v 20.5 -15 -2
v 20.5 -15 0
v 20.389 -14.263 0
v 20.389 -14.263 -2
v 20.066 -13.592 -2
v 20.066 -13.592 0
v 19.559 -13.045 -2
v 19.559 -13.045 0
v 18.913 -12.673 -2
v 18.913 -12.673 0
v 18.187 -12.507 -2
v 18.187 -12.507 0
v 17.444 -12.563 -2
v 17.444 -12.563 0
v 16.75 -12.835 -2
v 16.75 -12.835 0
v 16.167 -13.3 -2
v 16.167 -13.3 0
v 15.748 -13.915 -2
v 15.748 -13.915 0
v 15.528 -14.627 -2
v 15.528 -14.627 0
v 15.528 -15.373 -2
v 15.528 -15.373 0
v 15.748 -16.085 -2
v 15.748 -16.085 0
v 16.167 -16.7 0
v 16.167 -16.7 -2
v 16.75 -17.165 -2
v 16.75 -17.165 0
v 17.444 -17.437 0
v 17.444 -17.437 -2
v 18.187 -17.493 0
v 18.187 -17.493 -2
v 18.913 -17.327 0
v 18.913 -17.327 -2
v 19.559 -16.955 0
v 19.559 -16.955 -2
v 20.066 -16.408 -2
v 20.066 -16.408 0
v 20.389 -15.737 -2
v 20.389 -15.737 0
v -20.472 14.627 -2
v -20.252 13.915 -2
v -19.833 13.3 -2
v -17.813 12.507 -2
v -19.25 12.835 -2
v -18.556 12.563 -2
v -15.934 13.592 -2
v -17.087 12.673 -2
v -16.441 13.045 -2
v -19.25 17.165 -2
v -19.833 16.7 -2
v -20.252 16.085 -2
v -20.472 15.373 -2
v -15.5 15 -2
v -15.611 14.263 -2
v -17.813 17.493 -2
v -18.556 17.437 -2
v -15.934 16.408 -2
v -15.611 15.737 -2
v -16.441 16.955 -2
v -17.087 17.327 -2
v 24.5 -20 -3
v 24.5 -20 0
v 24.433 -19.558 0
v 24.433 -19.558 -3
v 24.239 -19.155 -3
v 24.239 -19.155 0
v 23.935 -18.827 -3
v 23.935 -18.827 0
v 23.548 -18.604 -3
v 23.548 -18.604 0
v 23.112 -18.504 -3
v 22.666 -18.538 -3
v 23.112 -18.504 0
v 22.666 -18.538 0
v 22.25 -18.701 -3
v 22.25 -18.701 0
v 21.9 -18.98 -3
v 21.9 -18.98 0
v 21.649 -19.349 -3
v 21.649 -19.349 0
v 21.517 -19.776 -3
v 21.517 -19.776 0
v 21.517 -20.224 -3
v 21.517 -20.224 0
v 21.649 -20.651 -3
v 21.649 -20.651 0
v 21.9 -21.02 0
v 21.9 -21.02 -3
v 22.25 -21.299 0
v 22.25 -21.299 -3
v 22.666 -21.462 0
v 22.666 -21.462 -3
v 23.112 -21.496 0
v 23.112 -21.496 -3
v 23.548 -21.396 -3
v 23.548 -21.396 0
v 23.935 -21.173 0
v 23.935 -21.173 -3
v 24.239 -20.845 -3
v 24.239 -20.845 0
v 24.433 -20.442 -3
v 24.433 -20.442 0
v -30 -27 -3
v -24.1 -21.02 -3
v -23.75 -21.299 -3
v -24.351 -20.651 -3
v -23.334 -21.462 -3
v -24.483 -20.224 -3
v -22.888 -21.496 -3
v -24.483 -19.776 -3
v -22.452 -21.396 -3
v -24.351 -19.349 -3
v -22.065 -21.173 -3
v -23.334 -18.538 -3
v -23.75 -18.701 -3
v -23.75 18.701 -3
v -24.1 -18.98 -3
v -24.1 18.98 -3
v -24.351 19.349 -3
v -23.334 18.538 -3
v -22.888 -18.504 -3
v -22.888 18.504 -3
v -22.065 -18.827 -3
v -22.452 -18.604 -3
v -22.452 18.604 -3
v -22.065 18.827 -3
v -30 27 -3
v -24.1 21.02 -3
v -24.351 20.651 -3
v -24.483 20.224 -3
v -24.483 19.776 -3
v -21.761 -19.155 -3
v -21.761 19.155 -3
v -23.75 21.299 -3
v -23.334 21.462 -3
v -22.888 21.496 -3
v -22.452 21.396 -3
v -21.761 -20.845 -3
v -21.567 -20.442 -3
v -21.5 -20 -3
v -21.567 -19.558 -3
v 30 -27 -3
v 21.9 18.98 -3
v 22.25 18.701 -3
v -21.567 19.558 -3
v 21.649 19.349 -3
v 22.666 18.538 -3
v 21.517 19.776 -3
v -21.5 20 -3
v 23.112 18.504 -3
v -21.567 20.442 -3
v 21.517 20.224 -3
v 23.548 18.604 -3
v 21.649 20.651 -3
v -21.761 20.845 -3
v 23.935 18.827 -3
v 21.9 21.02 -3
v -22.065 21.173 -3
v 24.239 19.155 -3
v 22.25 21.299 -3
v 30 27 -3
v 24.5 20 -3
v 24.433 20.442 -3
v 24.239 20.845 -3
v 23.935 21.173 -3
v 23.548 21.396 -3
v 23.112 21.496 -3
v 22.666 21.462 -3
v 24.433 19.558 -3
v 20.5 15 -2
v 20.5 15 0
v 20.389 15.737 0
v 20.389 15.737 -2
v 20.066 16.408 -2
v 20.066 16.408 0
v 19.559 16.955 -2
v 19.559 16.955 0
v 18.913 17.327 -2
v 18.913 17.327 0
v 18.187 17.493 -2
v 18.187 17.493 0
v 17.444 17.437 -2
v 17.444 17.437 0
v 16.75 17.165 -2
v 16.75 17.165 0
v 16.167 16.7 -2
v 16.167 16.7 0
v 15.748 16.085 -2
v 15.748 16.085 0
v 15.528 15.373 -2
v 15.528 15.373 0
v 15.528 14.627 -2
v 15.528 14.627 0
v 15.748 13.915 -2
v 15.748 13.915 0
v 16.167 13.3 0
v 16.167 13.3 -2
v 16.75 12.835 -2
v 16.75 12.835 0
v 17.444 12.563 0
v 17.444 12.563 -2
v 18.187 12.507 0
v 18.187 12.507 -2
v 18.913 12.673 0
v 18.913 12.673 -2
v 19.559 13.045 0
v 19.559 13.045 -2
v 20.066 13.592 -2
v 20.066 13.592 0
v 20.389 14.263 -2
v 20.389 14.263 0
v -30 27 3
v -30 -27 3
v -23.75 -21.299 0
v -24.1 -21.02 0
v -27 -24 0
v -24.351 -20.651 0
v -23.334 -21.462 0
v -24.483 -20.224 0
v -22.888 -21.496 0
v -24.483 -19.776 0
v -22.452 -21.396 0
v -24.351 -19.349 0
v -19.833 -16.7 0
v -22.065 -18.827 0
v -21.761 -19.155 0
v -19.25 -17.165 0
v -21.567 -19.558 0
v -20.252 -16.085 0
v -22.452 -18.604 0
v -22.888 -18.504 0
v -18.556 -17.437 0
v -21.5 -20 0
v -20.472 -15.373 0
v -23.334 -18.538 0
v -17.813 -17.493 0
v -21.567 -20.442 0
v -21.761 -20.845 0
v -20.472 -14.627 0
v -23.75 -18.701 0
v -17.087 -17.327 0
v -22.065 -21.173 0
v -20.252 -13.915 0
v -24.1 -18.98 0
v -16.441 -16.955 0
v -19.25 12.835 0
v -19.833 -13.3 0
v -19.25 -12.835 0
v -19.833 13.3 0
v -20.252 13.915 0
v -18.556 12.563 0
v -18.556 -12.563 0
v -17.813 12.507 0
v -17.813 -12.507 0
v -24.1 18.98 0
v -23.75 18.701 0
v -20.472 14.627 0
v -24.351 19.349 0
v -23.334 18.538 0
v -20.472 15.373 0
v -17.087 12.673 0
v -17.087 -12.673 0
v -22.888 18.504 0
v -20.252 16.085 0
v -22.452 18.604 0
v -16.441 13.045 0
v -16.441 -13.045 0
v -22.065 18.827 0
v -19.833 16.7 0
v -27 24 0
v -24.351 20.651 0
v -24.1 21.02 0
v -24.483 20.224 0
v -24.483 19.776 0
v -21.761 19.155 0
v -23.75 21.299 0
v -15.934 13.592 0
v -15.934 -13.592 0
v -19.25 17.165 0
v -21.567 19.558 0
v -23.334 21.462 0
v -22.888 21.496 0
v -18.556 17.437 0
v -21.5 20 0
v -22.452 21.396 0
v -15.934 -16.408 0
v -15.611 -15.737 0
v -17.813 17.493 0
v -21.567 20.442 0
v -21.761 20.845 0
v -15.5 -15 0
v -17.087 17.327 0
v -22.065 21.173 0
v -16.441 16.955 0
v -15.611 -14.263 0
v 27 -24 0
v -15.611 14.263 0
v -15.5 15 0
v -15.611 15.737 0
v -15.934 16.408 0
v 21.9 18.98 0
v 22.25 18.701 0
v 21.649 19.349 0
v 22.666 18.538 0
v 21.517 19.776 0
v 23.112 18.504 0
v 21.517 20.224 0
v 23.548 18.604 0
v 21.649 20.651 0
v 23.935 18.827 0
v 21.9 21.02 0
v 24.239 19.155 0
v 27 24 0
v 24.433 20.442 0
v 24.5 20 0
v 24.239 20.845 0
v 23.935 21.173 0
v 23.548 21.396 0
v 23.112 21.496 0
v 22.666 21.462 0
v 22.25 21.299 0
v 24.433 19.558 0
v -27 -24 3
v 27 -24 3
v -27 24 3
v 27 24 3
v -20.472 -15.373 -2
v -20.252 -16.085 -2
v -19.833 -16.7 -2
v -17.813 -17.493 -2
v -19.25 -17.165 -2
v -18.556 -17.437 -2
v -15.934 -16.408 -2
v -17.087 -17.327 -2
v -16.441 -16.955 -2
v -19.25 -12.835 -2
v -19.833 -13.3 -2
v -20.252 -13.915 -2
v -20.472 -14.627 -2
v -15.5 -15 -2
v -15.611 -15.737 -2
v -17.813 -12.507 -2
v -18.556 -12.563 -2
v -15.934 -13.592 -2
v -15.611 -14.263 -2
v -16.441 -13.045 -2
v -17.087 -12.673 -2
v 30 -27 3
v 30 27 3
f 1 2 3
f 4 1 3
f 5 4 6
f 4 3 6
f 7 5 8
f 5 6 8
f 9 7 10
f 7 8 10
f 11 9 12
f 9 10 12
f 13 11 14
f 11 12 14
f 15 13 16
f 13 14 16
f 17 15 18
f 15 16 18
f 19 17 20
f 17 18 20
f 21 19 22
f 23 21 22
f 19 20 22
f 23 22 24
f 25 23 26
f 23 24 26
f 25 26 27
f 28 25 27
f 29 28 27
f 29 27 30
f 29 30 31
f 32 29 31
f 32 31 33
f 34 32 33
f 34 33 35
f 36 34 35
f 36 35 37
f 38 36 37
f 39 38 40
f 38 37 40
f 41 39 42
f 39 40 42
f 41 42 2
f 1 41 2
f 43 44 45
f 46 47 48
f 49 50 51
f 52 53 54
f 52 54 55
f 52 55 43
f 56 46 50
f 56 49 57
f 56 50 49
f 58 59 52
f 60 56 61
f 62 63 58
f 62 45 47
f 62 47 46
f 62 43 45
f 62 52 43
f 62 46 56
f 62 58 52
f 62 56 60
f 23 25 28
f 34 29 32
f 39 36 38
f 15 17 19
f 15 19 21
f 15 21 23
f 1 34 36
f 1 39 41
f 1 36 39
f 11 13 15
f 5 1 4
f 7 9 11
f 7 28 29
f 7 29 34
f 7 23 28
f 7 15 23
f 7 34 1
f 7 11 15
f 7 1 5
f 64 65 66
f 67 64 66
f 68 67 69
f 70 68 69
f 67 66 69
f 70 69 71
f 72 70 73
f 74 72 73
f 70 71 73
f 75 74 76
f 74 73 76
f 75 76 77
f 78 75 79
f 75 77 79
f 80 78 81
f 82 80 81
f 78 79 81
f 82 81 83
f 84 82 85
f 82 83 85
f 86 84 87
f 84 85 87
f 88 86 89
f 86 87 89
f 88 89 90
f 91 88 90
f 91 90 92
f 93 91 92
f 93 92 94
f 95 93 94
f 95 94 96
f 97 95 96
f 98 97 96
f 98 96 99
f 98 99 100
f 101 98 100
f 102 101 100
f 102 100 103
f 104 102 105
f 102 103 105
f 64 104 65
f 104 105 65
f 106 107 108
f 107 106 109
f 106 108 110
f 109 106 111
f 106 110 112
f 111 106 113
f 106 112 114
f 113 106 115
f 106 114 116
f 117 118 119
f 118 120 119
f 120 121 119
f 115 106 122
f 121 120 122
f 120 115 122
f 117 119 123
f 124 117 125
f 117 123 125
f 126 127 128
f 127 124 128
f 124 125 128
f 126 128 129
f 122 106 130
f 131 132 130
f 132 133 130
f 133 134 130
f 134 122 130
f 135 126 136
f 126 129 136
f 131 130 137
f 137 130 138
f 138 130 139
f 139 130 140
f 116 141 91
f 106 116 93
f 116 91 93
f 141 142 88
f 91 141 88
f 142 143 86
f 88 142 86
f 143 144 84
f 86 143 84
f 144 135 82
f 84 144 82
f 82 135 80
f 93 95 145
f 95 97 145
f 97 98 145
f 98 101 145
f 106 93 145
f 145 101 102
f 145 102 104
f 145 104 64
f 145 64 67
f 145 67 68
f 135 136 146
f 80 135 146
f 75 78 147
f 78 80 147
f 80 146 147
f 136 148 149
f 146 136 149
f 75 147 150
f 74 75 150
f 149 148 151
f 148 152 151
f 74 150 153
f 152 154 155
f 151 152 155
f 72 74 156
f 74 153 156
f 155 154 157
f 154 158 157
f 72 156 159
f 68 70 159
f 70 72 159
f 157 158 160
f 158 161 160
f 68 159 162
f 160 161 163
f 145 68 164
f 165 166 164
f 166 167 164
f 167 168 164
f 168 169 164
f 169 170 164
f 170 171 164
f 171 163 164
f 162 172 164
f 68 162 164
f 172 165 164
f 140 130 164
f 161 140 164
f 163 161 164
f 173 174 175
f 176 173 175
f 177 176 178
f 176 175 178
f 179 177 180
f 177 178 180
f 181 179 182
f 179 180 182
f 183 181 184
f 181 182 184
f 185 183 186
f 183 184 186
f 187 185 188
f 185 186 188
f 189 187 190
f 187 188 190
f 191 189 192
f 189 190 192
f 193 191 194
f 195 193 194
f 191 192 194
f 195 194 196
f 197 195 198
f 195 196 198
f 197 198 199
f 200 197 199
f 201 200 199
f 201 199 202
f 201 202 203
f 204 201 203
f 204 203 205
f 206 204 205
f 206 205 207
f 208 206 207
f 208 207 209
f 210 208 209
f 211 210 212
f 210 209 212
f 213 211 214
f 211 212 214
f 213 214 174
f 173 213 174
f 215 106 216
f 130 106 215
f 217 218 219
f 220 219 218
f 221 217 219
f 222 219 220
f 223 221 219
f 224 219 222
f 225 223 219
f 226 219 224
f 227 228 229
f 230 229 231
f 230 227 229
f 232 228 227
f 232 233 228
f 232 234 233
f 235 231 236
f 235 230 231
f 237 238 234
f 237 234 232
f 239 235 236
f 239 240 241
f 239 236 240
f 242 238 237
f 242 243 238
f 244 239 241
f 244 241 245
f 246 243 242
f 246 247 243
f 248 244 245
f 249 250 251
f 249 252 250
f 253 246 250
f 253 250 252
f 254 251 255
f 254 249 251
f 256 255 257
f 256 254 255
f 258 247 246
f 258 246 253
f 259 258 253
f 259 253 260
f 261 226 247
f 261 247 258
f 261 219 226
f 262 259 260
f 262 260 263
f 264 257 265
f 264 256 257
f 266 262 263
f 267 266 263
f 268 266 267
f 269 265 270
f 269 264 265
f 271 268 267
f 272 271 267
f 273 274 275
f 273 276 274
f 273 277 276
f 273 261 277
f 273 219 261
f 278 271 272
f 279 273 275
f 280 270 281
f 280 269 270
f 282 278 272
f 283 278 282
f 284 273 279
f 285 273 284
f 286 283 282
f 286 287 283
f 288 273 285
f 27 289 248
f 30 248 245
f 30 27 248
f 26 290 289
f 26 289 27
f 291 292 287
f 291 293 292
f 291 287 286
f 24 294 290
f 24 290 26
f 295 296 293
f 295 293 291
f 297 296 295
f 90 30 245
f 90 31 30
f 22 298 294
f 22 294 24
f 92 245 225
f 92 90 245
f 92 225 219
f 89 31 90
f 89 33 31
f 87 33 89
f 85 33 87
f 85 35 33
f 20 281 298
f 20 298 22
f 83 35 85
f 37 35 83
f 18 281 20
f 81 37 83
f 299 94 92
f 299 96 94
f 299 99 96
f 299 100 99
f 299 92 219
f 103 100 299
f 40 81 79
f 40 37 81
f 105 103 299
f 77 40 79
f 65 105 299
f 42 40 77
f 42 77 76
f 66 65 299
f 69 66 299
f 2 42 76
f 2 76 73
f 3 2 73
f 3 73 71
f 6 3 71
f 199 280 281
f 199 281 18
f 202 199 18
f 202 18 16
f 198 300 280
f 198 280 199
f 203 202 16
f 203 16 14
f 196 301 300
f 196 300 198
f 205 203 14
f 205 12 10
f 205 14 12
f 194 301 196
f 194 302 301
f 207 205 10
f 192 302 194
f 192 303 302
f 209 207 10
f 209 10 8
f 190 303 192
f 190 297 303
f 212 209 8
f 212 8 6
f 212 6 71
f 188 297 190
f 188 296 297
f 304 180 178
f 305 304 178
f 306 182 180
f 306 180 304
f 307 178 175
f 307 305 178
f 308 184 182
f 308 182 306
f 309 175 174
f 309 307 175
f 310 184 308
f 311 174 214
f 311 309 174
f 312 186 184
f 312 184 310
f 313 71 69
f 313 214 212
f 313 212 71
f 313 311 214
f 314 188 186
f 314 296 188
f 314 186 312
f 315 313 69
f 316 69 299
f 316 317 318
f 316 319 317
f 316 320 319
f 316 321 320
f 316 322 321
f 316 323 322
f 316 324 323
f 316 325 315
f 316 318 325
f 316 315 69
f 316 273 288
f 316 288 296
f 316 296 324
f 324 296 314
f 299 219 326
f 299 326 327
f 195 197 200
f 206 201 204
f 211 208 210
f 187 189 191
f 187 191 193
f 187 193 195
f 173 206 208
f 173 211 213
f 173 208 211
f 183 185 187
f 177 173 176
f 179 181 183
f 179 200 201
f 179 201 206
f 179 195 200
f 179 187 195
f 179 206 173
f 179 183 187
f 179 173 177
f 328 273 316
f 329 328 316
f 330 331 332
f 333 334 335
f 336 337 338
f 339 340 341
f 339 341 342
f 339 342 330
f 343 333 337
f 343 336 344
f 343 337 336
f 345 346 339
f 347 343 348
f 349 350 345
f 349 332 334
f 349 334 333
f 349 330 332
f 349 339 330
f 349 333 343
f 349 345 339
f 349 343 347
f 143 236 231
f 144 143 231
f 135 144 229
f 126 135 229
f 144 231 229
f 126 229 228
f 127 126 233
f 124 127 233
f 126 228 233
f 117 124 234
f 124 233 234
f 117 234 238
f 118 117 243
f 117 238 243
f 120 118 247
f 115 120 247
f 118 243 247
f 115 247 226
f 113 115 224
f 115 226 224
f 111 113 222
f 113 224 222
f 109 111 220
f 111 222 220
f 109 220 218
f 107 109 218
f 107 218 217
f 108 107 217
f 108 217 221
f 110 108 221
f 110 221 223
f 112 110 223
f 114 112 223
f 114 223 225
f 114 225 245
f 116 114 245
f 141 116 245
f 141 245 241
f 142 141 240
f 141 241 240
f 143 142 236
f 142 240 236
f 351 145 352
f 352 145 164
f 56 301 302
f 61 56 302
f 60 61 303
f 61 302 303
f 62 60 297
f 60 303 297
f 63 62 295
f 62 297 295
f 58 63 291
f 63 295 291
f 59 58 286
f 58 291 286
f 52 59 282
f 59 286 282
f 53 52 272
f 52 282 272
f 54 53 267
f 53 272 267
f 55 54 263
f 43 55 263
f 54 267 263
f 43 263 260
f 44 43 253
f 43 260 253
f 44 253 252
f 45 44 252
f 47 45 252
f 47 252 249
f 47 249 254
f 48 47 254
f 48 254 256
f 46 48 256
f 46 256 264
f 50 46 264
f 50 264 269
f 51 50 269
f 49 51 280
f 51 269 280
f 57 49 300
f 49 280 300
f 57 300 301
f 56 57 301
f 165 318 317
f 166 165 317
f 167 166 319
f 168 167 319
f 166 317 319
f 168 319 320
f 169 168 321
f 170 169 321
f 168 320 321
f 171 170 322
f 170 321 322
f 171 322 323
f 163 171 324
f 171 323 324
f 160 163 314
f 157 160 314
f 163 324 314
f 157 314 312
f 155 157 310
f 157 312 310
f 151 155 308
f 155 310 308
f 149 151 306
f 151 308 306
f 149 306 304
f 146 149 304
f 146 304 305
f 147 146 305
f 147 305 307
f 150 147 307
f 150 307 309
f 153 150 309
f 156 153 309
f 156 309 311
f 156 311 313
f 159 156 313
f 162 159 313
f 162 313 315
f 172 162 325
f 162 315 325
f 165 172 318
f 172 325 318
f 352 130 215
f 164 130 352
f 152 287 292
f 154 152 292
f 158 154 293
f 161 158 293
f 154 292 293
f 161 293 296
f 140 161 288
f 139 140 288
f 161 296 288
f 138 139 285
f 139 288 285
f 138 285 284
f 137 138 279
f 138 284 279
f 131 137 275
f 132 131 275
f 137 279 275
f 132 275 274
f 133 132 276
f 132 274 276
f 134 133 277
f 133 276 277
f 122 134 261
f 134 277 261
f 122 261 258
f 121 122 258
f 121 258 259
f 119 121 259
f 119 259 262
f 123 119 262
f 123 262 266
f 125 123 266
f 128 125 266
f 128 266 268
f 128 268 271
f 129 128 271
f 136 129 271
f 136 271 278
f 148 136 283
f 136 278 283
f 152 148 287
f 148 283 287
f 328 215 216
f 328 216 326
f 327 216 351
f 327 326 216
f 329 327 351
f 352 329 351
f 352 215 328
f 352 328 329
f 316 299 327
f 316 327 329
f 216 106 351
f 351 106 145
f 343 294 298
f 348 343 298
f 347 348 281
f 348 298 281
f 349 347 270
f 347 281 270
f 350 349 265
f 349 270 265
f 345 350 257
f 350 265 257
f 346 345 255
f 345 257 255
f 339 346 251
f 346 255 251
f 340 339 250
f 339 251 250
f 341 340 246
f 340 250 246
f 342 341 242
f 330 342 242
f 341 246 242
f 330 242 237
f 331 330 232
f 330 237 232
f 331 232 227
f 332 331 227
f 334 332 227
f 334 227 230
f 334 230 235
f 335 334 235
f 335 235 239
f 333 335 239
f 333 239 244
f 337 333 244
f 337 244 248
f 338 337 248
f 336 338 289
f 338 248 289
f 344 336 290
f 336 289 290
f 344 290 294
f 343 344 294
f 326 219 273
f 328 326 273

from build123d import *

# Parameters (mm, degrees)
F0_W     = 60
F0_H     = 54
F0_W_2   = 54
F0_H_2   = 48
F1_DEPTH = 3
F2_DEPTH = 3
F3_R     = 2.5
F4_DEPTH = 2
F5_R     = 1.5
F6_DEPTH = 3


with BuildPart() as f1:
    # F0 (on Top) → F1 (new body)
    with BuildSketch(Plane.XY):
        Rectangle(F0_W, F0_H)
        Rectangle(F0_W_2, F0_H_2, mode=Mode.SUBTRACT)
        Rectangle(F0_W_2, F0_H_2)
    extrude(amount=-F1_DEPTH)

    # F0 (on Top) → F2 (join)
    with BuildSketch(Plane.XY):
        Rectangle(F0_W, F0_H)
        Rectangle(F0_W_2, F0_H_2, mode=Mode.SUBTRACT)
    extrude(amount=F2_DEPTH)

    # F3 (on face) → F4 (cut)
    with BuildSketch(Plane.XY):
        with Locations((-18, 15)):
            Circle(F3_R)
        with Locations((18, 15)):
            Circle(F3_R)
        with Locations((18, -15)):
            Circle(F3_R)
        with Locations((-18, -15)):
            Circle(F3_R)
    extrude(amount=-F4_DEPTH, mode=Mode.SUBTRACT)

    # F5 (on face) → F6 (cut, through all)
    with BuildSketch(Plane.XY):
        with Locations((-23, 20)):
            Circle(F5_R)
        with Locations((23, 20)):
            Circle(F5_R)
        with Locations((-23, -20)):
            Circle(F5_R)
        with Locations((23, -20)):
            Circle(F5_R)
    extrude(amount=-F6_DEPTH, mode=Mode.SUBTRACT)


solid = f1.part
